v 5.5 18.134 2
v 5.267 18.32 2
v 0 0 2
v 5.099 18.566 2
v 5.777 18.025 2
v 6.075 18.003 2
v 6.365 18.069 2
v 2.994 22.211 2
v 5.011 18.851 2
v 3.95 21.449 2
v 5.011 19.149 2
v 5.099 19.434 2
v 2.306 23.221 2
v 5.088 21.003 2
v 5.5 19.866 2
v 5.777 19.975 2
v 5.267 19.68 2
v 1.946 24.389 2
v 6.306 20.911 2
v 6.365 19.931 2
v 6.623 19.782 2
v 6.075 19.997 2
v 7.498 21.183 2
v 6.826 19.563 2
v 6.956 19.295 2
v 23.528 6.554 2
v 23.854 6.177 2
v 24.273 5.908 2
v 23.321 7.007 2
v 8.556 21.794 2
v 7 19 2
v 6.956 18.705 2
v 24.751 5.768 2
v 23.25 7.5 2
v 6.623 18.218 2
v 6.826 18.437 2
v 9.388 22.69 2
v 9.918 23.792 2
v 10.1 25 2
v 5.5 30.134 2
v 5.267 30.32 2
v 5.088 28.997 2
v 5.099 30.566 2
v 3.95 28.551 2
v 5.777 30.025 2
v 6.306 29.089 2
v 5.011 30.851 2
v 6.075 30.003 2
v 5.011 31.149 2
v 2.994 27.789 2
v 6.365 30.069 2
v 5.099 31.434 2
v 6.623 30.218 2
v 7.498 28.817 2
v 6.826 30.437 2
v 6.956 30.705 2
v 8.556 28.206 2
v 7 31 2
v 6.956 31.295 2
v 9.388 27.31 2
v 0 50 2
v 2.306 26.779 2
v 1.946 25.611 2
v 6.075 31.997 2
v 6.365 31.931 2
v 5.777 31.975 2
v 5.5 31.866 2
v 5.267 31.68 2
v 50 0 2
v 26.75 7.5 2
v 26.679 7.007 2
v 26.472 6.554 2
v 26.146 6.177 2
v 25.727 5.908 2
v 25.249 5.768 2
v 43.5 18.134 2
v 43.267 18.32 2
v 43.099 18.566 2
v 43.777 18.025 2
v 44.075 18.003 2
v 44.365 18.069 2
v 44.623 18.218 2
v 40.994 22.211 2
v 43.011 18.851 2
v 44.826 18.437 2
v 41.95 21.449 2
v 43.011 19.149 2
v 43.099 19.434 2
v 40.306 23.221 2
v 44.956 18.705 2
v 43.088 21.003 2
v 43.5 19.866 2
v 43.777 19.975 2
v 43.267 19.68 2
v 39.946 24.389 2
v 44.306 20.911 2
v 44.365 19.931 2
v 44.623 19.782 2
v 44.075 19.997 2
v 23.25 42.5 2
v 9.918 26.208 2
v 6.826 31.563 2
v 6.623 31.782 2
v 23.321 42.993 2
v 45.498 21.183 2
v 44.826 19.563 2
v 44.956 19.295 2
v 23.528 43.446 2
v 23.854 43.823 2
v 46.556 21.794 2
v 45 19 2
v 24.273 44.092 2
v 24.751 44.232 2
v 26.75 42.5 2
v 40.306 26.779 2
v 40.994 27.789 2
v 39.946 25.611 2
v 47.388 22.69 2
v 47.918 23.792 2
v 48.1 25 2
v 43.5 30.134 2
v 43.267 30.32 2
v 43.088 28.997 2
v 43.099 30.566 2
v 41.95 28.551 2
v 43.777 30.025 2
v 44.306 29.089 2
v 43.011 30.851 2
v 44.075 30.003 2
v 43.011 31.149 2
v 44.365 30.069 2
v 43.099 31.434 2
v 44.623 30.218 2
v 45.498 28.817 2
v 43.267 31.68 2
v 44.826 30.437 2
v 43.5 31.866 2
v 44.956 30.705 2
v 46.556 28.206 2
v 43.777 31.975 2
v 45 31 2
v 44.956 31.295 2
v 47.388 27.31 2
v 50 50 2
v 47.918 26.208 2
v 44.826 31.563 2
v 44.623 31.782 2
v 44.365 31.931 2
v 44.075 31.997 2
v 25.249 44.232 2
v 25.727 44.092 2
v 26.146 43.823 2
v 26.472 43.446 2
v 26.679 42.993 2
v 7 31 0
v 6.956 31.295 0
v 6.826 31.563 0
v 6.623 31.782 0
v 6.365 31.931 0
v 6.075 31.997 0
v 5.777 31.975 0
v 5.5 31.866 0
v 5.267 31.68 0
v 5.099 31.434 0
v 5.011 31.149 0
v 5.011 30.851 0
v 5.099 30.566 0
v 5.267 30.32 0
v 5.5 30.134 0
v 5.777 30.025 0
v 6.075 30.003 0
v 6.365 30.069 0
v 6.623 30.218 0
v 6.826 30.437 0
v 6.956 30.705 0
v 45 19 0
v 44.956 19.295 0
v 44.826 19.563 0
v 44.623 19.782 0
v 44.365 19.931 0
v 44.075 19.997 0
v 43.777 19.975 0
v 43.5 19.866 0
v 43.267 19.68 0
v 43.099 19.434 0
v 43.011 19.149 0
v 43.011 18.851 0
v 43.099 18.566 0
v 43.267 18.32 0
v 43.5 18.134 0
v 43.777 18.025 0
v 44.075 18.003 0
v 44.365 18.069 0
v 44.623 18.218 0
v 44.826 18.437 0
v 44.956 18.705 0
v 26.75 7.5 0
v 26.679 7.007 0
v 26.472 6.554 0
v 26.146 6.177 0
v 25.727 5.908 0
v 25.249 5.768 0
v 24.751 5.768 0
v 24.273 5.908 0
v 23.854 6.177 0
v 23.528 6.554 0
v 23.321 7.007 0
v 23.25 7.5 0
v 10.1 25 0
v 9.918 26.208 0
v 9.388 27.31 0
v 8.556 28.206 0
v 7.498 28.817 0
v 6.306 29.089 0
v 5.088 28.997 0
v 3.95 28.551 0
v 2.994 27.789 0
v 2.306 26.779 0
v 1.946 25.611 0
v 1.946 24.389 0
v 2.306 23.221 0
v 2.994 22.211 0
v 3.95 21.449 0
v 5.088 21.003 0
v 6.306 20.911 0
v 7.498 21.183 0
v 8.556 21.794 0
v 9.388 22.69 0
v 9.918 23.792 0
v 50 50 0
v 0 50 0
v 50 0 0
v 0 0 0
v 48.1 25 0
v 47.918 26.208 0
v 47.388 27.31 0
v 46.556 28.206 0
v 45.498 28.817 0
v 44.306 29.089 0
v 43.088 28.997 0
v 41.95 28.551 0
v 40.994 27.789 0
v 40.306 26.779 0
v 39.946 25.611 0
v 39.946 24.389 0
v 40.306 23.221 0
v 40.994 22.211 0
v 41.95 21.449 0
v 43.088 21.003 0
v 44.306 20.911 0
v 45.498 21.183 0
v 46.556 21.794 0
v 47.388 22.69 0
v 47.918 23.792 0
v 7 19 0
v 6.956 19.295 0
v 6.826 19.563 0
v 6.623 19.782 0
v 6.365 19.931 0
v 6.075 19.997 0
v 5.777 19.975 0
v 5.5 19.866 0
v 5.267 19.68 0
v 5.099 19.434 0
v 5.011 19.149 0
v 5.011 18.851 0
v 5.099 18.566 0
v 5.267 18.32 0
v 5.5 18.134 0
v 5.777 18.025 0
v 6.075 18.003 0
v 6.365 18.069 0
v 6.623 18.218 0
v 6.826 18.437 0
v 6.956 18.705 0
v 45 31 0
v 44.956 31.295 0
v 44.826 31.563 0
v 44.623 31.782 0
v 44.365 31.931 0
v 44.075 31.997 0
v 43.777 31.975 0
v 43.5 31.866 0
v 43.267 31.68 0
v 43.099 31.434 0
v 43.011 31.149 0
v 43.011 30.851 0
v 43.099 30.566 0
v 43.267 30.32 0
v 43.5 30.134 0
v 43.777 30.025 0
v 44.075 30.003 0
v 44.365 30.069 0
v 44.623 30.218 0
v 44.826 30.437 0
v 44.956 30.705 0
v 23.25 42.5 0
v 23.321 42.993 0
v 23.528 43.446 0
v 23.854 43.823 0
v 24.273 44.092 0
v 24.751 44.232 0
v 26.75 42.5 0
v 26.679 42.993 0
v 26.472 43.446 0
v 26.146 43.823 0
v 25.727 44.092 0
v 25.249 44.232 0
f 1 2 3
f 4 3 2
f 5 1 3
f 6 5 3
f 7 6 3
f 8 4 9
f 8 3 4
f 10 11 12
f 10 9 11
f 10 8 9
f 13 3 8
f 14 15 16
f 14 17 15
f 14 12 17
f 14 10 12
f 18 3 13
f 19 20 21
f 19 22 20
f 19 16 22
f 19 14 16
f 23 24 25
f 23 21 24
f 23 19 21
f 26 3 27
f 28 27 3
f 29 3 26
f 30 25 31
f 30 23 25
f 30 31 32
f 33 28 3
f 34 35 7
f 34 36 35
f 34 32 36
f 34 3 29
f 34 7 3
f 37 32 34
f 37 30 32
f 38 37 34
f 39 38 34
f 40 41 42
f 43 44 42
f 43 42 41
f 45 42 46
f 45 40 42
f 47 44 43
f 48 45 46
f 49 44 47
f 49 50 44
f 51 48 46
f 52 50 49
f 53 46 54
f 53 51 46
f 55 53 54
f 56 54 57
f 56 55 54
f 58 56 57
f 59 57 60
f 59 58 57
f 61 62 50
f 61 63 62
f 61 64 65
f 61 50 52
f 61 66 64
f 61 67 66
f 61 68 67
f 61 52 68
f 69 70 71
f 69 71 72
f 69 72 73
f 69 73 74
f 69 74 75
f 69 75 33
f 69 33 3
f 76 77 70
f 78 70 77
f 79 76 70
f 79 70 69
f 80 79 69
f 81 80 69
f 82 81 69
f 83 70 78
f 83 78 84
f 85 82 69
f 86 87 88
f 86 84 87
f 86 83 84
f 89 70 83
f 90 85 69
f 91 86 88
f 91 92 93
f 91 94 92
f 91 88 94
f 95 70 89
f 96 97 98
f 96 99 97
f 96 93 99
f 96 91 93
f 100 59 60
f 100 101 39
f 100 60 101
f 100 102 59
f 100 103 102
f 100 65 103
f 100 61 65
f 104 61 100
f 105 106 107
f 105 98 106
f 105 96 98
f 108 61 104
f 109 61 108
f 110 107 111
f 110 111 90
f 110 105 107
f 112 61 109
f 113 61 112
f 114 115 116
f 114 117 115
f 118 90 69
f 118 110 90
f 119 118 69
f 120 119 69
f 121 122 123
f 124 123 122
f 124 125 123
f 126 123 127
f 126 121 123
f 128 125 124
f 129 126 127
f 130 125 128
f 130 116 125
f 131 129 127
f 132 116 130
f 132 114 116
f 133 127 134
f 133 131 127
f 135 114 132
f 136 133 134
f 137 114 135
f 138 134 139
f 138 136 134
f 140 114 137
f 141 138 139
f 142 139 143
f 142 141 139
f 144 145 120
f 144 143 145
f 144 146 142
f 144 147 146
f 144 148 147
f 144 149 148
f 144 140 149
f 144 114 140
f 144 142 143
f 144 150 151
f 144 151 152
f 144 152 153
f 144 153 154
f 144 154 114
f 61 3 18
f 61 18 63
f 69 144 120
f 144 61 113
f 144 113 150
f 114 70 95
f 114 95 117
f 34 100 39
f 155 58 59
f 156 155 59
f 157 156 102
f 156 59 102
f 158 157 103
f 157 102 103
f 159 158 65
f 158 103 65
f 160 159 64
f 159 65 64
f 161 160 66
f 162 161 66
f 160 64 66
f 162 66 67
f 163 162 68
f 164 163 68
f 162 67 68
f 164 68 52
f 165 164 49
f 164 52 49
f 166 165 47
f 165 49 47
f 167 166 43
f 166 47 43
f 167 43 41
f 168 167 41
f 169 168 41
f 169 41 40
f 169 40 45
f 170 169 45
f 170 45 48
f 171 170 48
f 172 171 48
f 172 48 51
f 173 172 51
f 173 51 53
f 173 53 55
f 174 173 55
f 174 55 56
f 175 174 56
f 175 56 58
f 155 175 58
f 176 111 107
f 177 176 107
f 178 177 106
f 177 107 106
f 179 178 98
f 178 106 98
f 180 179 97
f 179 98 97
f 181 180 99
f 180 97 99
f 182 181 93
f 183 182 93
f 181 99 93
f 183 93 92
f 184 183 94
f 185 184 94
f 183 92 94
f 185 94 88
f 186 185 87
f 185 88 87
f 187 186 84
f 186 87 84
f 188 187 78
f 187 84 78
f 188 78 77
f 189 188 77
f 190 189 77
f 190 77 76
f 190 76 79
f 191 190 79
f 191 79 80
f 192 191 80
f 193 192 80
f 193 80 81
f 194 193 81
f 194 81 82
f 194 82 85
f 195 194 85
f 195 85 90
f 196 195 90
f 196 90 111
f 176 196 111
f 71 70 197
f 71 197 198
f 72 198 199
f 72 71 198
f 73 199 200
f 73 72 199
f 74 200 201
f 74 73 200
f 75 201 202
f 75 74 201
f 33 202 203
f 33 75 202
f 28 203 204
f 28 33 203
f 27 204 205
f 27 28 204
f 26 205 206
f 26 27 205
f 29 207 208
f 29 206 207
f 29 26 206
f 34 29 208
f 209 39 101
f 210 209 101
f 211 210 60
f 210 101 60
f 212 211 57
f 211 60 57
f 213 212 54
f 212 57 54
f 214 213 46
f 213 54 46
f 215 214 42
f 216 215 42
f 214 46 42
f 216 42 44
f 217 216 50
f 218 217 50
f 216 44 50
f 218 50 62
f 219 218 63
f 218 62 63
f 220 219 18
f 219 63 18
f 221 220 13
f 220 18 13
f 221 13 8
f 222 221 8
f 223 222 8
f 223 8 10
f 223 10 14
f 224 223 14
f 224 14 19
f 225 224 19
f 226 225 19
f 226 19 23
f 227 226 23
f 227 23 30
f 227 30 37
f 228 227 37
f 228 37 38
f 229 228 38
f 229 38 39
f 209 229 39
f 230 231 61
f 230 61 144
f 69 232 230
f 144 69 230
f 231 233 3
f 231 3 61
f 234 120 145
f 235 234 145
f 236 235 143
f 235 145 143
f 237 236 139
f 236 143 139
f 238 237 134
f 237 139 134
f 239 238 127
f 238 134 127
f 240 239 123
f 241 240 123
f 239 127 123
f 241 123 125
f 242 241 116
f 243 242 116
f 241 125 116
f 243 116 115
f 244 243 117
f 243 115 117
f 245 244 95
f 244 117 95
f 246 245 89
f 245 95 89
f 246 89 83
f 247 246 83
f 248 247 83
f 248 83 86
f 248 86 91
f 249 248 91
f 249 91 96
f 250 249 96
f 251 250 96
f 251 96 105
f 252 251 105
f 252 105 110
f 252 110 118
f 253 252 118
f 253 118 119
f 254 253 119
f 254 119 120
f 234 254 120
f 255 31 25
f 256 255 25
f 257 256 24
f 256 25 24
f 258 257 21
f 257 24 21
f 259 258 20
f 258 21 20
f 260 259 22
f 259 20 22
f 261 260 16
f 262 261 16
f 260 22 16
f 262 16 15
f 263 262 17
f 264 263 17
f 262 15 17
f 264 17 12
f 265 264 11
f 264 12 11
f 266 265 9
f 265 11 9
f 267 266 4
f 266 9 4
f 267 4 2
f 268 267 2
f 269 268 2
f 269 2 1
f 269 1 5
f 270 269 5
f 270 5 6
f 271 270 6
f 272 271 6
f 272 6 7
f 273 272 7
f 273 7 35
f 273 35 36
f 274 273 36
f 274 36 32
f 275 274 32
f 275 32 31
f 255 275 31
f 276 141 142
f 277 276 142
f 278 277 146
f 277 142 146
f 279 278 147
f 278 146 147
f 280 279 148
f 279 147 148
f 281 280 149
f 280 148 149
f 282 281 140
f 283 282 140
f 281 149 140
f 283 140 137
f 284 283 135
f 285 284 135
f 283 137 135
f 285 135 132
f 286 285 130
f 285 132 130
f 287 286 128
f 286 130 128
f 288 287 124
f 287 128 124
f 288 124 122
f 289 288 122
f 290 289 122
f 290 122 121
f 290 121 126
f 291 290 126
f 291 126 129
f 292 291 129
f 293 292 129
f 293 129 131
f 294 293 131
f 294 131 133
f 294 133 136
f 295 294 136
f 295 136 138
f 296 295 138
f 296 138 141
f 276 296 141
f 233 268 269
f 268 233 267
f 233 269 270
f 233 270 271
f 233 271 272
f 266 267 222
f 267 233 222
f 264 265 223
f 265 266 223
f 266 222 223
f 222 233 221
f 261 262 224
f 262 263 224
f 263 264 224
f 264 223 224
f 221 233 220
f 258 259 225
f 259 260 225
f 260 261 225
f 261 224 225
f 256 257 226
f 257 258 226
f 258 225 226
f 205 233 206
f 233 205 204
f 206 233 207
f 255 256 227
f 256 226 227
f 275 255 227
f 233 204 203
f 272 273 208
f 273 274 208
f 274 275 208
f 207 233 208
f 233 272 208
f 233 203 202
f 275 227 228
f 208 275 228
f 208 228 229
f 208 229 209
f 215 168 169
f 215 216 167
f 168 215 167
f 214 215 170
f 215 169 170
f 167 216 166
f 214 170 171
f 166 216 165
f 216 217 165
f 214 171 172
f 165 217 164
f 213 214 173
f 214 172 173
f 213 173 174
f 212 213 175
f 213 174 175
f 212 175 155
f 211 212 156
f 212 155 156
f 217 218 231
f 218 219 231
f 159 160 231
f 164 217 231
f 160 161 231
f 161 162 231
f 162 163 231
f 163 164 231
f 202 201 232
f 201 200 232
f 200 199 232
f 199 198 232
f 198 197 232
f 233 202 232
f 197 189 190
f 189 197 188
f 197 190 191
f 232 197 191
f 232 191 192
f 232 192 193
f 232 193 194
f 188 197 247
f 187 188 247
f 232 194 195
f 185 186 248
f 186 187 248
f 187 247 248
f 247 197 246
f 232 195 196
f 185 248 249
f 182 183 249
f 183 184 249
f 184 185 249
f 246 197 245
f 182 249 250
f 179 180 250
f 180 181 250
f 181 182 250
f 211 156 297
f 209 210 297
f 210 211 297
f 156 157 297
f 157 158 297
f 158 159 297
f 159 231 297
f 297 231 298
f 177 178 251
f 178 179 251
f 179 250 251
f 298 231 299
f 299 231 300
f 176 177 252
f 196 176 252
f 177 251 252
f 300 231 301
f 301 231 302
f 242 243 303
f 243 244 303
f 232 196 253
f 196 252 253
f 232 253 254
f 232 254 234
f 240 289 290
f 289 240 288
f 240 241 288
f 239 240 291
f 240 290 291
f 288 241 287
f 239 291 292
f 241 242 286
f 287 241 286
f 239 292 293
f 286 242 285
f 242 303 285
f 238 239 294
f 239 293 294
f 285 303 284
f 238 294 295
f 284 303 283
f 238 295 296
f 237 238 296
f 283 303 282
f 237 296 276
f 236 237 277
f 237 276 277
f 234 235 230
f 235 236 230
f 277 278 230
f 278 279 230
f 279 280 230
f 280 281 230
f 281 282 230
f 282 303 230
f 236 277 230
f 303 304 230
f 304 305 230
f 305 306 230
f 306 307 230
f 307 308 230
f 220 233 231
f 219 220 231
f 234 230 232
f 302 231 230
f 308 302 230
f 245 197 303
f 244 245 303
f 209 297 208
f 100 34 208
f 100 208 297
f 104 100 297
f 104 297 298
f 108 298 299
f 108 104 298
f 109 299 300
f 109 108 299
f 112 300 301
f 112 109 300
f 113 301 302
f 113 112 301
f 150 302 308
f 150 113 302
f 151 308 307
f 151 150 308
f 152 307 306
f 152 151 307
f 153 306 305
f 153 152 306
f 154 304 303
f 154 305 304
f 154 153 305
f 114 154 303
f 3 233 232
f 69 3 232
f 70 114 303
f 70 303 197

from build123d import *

# Parameters (mm, degrees)
SKETCH1_W                = 50
SKETCH1_H                = 50
PLATE_BODY_DEPTH         = 2
SKETCH2_R                = 4.1
SHAFT_BEARINGS_DEPTH     = 3
SKETCH3_R                = 1
BEARING_BOLT_HOLES_DEPTH = 3
CUT_EXTRUDE1_DEPTH       = 3


with BuildPart() as part:
    # Sketch1 → plate_body (new body)
    with BuildSketch(Plane.XY):
        with Locations((25, 25)):
            Rectangle(SKETCH1_W, SKETCH1_H)
    extrude(amount=PLATE_BODY_DEPTH)

    # Sketch2 → shaft_bearings (cut, through all)
    with BuildSketch(Plane.XY.offset(2)):
        with Locations((6, 25)):
            Circle(SKETCH2_R)
        with Locations((44, 25)):
            Circle(SKETCH2_R)
    extrude(amount=-SHAFT_BEARINGS_DEPTH, mode=Mode.SUBTRACT)

    # Sketch3 → bearing_bolt_holes (cut, through all)
    with BuildSketch(Plane.XY.offset(2)):
        with Locations((6, 31)):
            Circle(SKETCH3_R)
        with Locations((6, 19)):
            Circle(SKETCH3_R)
        with Locations((44, 31)):
            Circle(SKETCH3_R)
        with Locations((44, 19)):
            Circle(SKETCH3_R)
    extrude(amount=-BEARING_BOLT_HOLES_DEPTH, mode=Mode.SUBTRACT)

    # Sketch4 → Cut-Extrude1 (cut, through all)
    with BuildSketch(Plane.XY.offset(2)):
        with BuildLine():
            Line((26.75, 42.5), (26.75, 7.5))
            ThreePointArc((26.75, 7.5), (25, 5.75), (23.25, 7.5))
            Line((23.25, 7.5), (23.25, 42.5))
            ThreePointArc((23.25, 42.5), (25, 44.25), (26.75, 42.5))
        make_face()
    extrude(amount=-CUT_EXTRUDE1_DEPTH, mode=Mode.SUBTRACT)


solid = part.part
